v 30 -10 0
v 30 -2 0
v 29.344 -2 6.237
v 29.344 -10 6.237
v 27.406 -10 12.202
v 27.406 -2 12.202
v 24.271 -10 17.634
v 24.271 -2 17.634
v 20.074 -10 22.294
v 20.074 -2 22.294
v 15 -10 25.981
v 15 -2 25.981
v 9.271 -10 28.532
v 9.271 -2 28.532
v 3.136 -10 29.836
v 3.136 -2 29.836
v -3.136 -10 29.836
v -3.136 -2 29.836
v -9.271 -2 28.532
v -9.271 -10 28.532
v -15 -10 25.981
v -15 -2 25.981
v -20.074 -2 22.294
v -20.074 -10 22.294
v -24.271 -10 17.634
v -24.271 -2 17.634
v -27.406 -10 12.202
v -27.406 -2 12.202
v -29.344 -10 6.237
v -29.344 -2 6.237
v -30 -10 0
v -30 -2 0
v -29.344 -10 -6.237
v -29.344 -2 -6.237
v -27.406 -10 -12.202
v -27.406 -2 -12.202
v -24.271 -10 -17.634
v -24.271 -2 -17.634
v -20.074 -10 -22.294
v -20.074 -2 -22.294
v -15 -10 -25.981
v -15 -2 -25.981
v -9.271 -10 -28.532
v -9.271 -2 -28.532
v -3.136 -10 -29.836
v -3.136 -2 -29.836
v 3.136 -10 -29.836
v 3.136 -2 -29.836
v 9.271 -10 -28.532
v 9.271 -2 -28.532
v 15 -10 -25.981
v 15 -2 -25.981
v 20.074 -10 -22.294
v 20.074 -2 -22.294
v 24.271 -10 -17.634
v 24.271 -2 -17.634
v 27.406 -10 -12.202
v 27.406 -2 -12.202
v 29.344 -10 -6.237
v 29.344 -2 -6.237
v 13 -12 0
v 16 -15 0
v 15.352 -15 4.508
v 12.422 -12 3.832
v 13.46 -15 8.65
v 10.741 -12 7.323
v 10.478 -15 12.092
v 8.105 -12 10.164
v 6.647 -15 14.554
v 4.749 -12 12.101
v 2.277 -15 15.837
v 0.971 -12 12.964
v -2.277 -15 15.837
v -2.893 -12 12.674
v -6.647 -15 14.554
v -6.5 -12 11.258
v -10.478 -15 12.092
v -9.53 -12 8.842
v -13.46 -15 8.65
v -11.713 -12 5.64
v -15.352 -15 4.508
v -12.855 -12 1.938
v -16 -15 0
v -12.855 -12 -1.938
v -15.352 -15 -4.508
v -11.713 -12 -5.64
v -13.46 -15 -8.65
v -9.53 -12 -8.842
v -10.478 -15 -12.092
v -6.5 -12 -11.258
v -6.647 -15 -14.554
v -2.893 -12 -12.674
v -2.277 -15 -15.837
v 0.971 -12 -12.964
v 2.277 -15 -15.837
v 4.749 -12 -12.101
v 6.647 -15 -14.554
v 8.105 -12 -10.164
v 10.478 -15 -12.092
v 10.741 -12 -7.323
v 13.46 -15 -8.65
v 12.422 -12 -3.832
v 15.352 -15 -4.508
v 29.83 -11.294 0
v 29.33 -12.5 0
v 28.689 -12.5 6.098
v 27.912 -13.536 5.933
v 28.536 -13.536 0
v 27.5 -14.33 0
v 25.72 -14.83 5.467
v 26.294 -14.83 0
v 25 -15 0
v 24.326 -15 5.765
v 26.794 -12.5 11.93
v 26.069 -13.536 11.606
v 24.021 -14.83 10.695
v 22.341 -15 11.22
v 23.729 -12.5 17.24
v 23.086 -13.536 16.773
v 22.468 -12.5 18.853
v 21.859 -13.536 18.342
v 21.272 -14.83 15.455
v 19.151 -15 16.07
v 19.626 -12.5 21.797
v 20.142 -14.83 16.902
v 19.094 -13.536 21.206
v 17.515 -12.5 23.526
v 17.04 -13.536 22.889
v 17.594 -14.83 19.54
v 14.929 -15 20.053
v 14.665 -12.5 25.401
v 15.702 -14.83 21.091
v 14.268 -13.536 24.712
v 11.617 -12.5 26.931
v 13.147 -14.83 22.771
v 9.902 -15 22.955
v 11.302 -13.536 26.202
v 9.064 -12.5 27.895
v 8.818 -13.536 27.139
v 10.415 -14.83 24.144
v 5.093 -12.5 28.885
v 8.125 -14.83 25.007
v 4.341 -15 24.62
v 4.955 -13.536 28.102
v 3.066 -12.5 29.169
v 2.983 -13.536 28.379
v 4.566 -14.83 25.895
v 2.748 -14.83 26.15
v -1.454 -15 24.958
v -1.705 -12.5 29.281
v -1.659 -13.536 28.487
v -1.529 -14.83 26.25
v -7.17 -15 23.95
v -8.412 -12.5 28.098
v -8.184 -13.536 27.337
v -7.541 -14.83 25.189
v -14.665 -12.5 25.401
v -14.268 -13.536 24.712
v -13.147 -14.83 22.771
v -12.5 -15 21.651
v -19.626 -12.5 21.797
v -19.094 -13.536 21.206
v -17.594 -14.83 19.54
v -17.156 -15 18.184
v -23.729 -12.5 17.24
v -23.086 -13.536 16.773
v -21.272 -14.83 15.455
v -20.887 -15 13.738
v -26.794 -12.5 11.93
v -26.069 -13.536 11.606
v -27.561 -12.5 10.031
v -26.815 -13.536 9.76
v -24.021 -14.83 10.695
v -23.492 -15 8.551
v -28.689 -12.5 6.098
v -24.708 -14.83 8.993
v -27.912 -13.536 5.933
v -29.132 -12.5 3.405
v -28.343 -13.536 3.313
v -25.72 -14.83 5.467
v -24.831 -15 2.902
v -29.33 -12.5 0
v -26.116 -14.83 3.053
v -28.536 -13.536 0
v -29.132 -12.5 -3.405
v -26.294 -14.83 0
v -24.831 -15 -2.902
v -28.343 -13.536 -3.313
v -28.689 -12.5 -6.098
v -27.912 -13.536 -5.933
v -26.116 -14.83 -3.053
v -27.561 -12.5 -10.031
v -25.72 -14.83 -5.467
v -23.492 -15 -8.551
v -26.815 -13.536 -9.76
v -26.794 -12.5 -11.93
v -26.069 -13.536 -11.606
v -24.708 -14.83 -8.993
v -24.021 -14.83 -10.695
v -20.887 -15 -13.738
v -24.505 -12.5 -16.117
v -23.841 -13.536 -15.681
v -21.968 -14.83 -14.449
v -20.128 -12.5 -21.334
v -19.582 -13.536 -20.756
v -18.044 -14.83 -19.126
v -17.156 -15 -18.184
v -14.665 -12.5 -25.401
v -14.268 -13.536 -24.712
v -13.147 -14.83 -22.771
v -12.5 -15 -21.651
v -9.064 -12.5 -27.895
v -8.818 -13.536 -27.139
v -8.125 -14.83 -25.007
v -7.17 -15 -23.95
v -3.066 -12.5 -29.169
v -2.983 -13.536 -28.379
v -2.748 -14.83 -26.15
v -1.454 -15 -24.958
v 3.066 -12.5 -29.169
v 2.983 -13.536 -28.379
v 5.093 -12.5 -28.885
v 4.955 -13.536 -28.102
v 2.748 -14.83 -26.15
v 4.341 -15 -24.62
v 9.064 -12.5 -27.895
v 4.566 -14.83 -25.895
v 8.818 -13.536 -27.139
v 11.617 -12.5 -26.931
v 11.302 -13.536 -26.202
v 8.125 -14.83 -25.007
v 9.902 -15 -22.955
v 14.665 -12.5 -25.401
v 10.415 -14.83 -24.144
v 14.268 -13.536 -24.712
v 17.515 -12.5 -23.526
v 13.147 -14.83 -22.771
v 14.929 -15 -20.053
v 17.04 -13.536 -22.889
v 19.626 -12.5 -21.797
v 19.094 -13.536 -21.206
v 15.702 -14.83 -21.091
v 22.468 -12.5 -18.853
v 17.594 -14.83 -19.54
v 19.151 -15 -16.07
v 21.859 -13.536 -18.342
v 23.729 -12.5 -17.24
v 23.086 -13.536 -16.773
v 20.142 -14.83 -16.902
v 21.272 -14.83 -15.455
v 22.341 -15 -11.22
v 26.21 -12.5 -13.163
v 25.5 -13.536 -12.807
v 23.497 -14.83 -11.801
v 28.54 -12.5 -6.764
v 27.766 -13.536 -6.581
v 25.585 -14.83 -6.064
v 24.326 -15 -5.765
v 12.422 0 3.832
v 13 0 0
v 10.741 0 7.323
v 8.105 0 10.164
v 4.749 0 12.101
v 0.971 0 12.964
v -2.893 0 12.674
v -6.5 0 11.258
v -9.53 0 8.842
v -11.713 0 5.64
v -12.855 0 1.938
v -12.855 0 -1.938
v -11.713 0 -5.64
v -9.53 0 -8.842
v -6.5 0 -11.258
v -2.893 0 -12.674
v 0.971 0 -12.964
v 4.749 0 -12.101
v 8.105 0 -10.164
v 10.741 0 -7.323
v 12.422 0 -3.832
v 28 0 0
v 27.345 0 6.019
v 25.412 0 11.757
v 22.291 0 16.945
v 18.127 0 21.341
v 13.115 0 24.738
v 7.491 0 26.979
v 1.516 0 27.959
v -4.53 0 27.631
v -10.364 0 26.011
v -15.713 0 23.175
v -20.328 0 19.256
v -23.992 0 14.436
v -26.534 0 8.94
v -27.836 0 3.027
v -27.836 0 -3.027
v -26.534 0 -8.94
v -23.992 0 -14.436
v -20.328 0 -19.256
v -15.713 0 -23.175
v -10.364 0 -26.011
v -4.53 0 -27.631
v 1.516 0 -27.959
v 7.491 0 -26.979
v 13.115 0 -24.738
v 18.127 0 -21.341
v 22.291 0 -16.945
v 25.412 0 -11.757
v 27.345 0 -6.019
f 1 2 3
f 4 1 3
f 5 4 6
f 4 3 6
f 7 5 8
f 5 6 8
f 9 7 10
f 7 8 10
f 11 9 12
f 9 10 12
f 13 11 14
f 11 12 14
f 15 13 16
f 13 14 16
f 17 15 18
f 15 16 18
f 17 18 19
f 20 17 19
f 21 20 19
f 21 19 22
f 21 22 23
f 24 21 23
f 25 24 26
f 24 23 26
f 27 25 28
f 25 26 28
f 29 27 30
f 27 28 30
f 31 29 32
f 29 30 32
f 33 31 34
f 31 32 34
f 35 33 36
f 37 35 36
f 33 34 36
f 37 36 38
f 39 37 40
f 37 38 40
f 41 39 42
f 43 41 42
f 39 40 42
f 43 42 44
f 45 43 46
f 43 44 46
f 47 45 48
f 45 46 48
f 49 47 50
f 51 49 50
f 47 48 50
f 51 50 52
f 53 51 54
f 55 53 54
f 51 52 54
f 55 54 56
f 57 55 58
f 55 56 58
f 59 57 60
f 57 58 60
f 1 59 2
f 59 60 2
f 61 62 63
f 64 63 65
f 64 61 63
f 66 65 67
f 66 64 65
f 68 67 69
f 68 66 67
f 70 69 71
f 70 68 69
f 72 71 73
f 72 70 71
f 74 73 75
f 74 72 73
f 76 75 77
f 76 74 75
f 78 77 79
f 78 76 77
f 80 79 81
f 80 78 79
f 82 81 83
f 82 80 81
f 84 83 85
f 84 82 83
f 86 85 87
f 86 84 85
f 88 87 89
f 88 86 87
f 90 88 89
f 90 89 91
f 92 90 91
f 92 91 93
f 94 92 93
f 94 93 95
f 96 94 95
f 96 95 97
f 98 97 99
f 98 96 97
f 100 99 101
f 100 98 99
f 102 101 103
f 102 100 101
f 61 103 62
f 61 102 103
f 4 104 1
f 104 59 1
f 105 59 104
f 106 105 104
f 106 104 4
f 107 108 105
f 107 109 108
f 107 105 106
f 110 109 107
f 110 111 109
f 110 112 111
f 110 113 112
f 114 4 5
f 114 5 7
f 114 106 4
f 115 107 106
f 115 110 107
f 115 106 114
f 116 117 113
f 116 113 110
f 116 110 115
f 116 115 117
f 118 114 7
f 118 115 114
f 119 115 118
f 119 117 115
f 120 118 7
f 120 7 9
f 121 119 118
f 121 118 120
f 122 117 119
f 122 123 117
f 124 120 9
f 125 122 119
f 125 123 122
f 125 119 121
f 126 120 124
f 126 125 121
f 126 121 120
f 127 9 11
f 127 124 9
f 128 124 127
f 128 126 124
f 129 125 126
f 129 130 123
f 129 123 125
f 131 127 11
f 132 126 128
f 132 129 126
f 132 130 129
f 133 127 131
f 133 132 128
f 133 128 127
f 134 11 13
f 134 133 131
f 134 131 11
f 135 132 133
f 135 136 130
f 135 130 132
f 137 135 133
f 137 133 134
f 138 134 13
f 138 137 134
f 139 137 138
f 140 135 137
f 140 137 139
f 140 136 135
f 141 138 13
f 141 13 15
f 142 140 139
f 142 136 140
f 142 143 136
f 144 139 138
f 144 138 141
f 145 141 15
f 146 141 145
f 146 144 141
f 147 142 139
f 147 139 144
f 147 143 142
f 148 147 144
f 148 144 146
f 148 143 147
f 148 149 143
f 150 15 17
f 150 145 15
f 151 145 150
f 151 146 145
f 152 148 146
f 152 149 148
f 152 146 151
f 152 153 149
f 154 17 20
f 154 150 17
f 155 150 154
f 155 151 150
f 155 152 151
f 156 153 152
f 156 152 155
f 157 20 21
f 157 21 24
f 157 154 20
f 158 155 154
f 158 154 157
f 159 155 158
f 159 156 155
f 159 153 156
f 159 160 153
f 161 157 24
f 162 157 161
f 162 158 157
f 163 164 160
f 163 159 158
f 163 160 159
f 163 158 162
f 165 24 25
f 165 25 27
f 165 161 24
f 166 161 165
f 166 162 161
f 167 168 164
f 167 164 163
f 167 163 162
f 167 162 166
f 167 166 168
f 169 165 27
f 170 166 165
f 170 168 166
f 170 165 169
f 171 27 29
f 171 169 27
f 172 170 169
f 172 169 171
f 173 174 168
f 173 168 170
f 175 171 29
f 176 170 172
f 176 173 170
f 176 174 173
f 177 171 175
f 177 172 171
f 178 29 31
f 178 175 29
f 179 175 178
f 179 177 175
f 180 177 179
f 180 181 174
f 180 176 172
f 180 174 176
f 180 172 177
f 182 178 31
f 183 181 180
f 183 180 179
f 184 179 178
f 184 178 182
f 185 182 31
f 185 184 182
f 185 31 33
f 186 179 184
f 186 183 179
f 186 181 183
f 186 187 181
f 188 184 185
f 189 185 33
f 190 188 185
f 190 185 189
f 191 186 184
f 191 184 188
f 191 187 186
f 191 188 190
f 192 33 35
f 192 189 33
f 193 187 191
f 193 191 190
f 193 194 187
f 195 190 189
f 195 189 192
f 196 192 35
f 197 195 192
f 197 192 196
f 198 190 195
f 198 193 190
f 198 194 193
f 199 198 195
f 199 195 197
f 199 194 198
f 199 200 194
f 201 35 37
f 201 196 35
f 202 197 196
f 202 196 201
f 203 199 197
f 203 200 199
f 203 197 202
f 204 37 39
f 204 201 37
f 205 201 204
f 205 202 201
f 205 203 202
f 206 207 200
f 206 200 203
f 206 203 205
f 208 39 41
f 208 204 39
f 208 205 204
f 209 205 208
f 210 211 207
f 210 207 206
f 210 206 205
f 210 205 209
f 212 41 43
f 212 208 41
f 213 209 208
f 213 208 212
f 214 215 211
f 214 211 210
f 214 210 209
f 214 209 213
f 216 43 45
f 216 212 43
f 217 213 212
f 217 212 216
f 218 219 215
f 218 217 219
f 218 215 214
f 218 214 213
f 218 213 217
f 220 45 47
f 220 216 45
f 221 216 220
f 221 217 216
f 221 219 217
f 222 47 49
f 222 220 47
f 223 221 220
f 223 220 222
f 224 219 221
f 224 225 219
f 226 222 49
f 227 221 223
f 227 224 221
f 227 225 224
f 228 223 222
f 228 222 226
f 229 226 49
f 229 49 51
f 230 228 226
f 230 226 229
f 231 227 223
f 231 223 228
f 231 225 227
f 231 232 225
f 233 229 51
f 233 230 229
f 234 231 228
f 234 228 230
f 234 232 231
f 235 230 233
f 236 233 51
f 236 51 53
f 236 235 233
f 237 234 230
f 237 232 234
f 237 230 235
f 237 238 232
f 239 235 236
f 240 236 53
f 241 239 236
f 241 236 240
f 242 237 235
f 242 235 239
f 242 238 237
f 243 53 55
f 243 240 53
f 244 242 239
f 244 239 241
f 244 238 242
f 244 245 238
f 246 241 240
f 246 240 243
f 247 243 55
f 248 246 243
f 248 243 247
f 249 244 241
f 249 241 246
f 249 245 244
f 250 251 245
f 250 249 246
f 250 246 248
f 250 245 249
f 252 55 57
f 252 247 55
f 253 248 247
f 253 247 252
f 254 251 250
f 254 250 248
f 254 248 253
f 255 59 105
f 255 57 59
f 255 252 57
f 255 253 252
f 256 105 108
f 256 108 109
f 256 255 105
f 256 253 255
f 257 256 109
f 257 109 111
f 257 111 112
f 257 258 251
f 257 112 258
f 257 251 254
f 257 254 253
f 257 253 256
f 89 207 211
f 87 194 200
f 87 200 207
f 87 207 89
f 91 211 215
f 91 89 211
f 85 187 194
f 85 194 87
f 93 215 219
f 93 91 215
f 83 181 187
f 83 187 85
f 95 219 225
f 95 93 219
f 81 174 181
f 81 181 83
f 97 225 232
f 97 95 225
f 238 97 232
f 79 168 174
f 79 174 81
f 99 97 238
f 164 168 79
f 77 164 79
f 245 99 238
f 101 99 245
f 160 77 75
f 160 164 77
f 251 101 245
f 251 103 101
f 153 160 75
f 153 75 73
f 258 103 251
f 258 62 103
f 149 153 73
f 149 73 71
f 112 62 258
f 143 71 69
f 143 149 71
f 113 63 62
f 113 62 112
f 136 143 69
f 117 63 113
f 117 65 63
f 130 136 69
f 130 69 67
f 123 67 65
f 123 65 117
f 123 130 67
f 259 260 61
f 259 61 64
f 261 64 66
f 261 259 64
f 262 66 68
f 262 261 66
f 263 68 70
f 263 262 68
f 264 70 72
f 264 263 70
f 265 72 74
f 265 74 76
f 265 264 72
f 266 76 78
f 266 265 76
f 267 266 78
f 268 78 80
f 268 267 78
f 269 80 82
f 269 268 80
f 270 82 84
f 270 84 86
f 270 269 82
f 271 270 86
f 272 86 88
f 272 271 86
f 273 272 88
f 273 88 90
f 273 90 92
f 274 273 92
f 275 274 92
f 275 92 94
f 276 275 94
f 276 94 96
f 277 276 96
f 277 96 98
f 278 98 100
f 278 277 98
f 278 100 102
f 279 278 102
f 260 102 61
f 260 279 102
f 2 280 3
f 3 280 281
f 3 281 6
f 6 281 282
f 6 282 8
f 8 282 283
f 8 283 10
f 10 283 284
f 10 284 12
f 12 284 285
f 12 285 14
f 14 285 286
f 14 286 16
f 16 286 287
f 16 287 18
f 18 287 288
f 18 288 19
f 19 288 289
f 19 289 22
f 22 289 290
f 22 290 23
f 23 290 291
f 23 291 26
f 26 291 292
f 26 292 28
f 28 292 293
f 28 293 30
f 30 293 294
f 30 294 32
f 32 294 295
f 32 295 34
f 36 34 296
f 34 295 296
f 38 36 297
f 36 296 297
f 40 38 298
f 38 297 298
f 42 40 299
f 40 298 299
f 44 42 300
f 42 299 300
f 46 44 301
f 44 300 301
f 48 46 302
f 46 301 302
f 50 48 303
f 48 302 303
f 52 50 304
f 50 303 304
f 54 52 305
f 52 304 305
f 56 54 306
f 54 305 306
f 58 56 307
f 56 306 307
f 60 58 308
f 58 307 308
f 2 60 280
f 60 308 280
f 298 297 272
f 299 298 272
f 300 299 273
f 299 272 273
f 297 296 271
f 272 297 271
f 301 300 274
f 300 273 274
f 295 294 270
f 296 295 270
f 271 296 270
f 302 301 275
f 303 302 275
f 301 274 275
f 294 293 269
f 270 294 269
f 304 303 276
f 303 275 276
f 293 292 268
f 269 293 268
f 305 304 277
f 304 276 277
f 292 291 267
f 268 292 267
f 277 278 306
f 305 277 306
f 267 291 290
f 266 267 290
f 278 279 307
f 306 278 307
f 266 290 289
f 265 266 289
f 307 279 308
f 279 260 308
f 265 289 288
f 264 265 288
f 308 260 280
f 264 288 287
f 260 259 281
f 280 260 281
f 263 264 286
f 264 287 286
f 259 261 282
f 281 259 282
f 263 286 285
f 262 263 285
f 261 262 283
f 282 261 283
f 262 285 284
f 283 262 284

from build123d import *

# Parameters (mm, degrees)
F0_R     = 30
F0_R_2   = 13
F1_DEPTH = 15
F2_R     = 5
F3_SIZE  = 3
F4_SIZE  = 2


with BuildPart() as f1:
    # F0 (on Front) → F1 (new body)
    with BuildSketch(Plane.XZ):
        Circle(F0_R)
        Circle(F0_R_2, mode=Mode.SUBTRACT)
    extrude(amount=F1_DEPTH)

    # F2
    f2_edges = [f1.edges().sort_by_distance(p)[0] for p in [
        (-30, -15, 0),
    ]]
    fillet(f2_edges, radius=F2_R)

    # F3
    f3_edges = [f1.edges().sort_by_distance(p)[0] for p in [
        (-13, -15, 0),
    ]]
    chamfer(f3_edges, length=F3_SIZE)

    # F4
    f4_edges = [f1.edges().sort_by_distance(p)[0] for p in [
        (-30, 0, 0),
    ]]
    chamfer(f4_edges, length=F4_SIZE)


solid = f1.part
